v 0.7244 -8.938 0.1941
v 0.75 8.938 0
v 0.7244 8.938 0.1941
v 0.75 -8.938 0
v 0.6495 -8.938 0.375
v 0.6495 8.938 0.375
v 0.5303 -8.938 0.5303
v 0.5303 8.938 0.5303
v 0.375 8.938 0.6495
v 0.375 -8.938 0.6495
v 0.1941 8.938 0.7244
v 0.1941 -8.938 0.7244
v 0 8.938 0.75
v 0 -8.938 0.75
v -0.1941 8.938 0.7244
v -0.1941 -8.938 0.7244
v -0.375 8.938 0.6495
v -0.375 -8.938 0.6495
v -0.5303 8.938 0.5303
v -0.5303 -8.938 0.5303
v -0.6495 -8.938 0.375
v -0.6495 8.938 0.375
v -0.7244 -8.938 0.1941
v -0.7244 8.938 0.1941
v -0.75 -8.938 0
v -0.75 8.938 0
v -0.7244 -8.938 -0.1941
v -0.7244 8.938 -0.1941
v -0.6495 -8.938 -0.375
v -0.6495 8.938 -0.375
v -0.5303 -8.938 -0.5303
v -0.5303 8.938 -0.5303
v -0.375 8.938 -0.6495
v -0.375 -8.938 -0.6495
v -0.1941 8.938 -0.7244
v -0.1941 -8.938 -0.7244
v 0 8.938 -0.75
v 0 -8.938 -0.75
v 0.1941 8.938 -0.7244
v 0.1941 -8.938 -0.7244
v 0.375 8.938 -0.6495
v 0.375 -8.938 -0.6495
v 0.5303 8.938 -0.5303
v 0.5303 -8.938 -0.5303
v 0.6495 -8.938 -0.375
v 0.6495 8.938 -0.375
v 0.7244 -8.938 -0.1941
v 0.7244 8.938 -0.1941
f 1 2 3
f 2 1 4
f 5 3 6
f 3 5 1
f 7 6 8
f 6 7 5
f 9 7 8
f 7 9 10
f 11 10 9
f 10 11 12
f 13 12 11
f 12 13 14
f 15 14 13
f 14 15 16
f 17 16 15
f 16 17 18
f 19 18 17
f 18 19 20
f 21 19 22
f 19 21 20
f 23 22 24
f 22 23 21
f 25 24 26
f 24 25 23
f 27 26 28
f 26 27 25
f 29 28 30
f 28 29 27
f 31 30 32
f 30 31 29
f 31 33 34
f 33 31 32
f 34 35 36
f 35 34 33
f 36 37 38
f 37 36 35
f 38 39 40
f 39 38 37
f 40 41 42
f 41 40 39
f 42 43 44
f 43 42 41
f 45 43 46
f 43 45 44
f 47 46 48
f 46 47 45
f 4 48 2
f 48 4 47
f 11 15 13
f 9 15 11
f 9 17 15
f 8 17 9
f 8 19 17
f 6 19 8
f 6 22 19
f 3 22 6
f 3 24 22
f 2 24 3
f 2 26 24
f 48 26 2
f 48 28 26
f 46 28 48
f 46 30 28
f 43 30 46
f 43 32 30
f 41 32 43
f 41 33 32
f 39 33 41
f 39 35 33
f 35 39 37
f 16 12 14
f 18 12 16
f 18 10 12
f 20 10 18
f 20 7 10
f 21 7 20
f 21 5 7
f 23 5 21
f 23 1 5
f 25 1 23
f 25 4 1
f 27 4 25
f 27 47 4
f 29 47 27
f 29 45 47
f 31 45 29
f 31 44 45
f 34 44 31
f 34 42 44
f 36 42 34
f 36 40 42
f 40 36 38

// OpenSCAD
// file: layout.scad
// Rack layout geometry. Include config.scad once before this file.
// Functions are ordered so each name is defined before use (OpenSCAD 2021).

function rack_center_x() = 0;
function rack_center_y() = 0;

function x_divider_center_x(i) =
  rack_center_x() + divider_offset_from_center_in[i];

function divider_inner_left_x() =
  x_divider_center_x(0) + wall_thickness_in / 2;
function divider_inner_right_x() =
  x_divider_center_x(num_rows) - wall_thickness_in / 2;

function end_wall_inner_front_y() =
  rack_center_y() + end_wall_inner_offset_from_center_y[0];
function end_wall_inner_back_y() =
  rack_center_y() + end_wall_inner_offset_from_center_y[1];

function footprint_d_in() = max(
  end_wall_inner_back_y() - end_wall_inner_front_y(),
  (tubes_per_row - 1) * row_depth_in + tube_od_in
);

function layout_half_span_in() =
  max(
    max([for (i = [0 : num_rows - 1]) abs(column_tube_offset_from_center_in[i])])
      + tube_od_in / 2,
    max([for (i = [0 : num_rows]) abs(divider_offset_from_center_in[i])])
      + wall_thickness_in / 2
  );

function end_wall_w_in() =
  x_divider_center_x(num_rows) - x_divider_center_x(0) + wall_thickness_in
    + 2 * end_wall_extension_in;
function end_wall_x0() =
  x_divider_center_x(0) - wall_thickness_in / 2 - end_wall_extension_in;
function end_wall_height_in() = wall_height_in;

function tube_center_y(col_i) =
  rack_center_y() + depth_tube_offset_from_center_in[col_i];

function column_board_length_in() = footprint_d_in() + column_board_extension_in;
function column_board_y0() =
  rack_center_y() - column_board_length_in() / 2;
function board_half_lap_z_in() = wall_height_in / 2;

function num_middle_row_dividers() = tubes_per_row - 1;

function middle_row_divider_center_y(i) =
  rack_center_y()
    + (depth_tube_offset_from_center_in[i]
      + depth_tube_offset_from_center_in[i + 1])
      / 2;

function middle_row_z0_in() = board_half_lap_z_in();
function middle_row_height_in() = wall_height_in;
function middle_row_half_lap_z_in() = middle_row_height_in() / 2;
// Lap in the column upper band (overlap with column is only wall_height - z0).
function column_middle_row_notch_z0() =
  middle_row_z0_in() + (wall_height_in - middle_row_z0_in()) / 2;
function column_middle_row_notch_h_in() =
  (wall_height_in - middle_row_z0_in()) / 2;
function row_board_middle_w_in() = end_wall_w_in();
function row_board_middle_x0() = end_wall_x0();

function footprint_w_in() = max(
  divider_inner_right_x() - divider_inner_left_x(),
  2 * (layout_half_span_in() + tilt_pad_x_in)
);

function bay_center_x(row_i) =
  rack_center_x() + column_tube_offset_from_center_in[row_i];

function divider_clear_span_x(bay_i) =
  divider_offset_from_center_in[bay_i + 1]
    - divider_offset_from_center_in[bay_i]
    - wall_thickness_in;

// --- Top dowels (middle + inner primitives; rack.scad places num_row_dowels_top copies) ---
function dowel_layer_z0_in() =
  middle_row_z0_in() + middle_row_height_in() + dowel_above_middle_row_in;

function row_dowel_length_y_in() = column_board_length_in();

function row_dowel_od_at(i) = row_dowel_od_in[i];

function row_dowel_center_z_in(i) = dowel_layer_z0_in() + row_dowel_od_at(i) / 2;

function row_dowel_placement_x(i) =
  rack_center_x() + row_dowel_x_offset_from_center_in[i];

function row_dowel_tube_column(i) = row_dowel_tube_column_i[i];
// file: config.scad
// Finale mortar rack — shared parameters (inches unless noted)

// --- Tubes (inventory) ---
tube_od_in = 2.375;
tube_length_in = 12;
shell_nominal_in = 2; // Class C 2 in. mortars

// --- Layout ---
num_rows = 5;
tubes_per_row = 5; // 5×5 per rack × 2 racks = 50 tubes (Commander finale)
num_dividers_x = num_rows + 1; // 6 green boards: left side + 4 between columns + right side
board_thickness_in = 0.5;
tube_gap_in = 0.25; // extra clearance inside each cell
row_spacing_in = tube_od_in + board_thickness_in + tube_gap_in;
row_depth_in = tube_od_in + board_thickness_in + tube_gap_in;

// --- Column layout (+X = right, from rack center) ---
column_tube_offset_from_center_in = [
  -6.5, // 0 outer left
  -3, // 1 middle left
  0,      // 2 center
  3,  // 3 middle right
  6.5,  // 4 outer right
];
divider_offset_from_center_in = [
  -9,     // 0 left side (outer)
  -5,     // 1 outer left | middle left
  -1.5,   // 2 middle left | center
  1.5,    // 3 center | middle right
  5,      // 4 middle right | outer right
  9,      // 5 right side (outer)
];

// --- Depth layout (+Y = toward back, from rack center) ---
depth_tube_offset_from_center_in = [
  -6.25, // 0 front
  -3.125,
  0,     // 2 center
  3.125,
  6.25,  // 4 back
];
end_wall_inner_offset_from_center_y = [
  -7.438, // front inner face
  7.438,  // back inner face
];

column_board_extension_in = 3; // +length along Y total (1-1/2 in. each end), centered on rack Y
end_wall_extension_in = 1; // brown ends: +1 in. per side in X (panel plane)
column_end_half_lap = true; // half-lap: columns lose bottom half, rows lose top half
middle_row_half_lap = true; // mid-height row dividers: bottom half out; columns lose top of upper half

// --- Top dowels (four cylinders along +Y, centered on rack Y) ---
num_row_dowels_top = 4;
row_dowel_x_offset_from_center_in = [
  -6,     // 0 inside outer-left column (bay 0)
  -2,  // 1 outside middle column, left (bay 1)
  2,   // 2 outside middle column, right (bay 3)
  6,      // 3 inside outer-right column (bay 4)
];
row_dowel_bay_i = [0, 1, 3, 4]; // green-column bay per dowel (for OD)
row_dowel_tube_column_i = [0, 1, 3, 4]; // tubes to subtract per dowel
dowel_above_middle_row_in = 1; // bottom of dowel sits this far above row-board-middle top
row_dowel_od_middle_in = 2;   // ±6 in. X (bay 0 / 4)
row_dowel_od_inner_in = 1.5;  // ±2 in. X (bay 1 / 3)
row_dowel_middle_i = [0, 3];
row_dowel_inner_i = [1, 2];
// OD per dowel index: [middle-L, inner-L, inner-R, middle-R]
row_dowel_od_in = [
  row_dowel_od_middle_in,
  row_dowel_od_inner_in,
  row_dowel_od_inner_in,
  row_dowel_od_middle_in,
];
dowel_fit_clearance_in = 0.125; // used when auto-sizing OD from bay span
center_tube_column_i = 2; // middle tube column (0..num_rows-1)

// --- Angles (degrees from vertical; left negative, right positive) ---
outer_angle_deg = 12;

function row_offset(i) = i - floor(num_rows / 2); // -2 .. +2 for 5 rows
function sign(x) = x < 0 ? -1 : (x > 0 ? 1 : 0);
function row_angle_deg(i) =
  let (o = row_offset(i))
  o == 0 ? 0 : sign(o) * outer_angle_deg * abs(o) / 2;

tilt_pad_x_in = tube_length_in * sin(outer_angle_deg) + tube_gap_in;

// --- Structure (1/2 in. plywood walls only) ---
wall_thickness_in = 0.5;
wall_height_in = 3.5; // row boards + column boards (same height)

color_wall_end = [0.90, 0.62, 0.38];
color_wall_side = [0.58, 0.72, 0.42];
color_middle_row = [0.45, 0.55, 0.85];
color_dowel_middle = [0.85, 0.75, 0.35];
color_dowel_standard = [0.75, 0.55, 0.25];
color_tube = [0.25, 0.45, 0.85, 0.85];

// --- Preview ---
preview = true;
$fn = preview ? 24 : 72;
show_tubes = true;
show_walls = true; // brown front/back ends
show_x_column_boards = true; // six green dividers along +X
show_middle_row_boards = true; // four mid-height row dividers (between tube rows along Y)
show_row_dowels_top = true; // dowels along Y between column boards
// main file
// Inner top dowel (±2 in. X): cylinder along +Y, origin at geometric center.
// rack.scad places row_dowel_inner_i instances.
include <config.scad>
include <layout.scad>

module row_dowel_top_inner_cylinder() {
  color(color_dowel_standard)
    rotate([90, 0, 0])
      cylinder(h = row_dowel_length_y_in(), d = row_dowel_od_inner_in, center = true);
}

if (is_undef(FINALE_RACK_ASSEMBLY))
  row_dowel_top_inner_cylinder();
